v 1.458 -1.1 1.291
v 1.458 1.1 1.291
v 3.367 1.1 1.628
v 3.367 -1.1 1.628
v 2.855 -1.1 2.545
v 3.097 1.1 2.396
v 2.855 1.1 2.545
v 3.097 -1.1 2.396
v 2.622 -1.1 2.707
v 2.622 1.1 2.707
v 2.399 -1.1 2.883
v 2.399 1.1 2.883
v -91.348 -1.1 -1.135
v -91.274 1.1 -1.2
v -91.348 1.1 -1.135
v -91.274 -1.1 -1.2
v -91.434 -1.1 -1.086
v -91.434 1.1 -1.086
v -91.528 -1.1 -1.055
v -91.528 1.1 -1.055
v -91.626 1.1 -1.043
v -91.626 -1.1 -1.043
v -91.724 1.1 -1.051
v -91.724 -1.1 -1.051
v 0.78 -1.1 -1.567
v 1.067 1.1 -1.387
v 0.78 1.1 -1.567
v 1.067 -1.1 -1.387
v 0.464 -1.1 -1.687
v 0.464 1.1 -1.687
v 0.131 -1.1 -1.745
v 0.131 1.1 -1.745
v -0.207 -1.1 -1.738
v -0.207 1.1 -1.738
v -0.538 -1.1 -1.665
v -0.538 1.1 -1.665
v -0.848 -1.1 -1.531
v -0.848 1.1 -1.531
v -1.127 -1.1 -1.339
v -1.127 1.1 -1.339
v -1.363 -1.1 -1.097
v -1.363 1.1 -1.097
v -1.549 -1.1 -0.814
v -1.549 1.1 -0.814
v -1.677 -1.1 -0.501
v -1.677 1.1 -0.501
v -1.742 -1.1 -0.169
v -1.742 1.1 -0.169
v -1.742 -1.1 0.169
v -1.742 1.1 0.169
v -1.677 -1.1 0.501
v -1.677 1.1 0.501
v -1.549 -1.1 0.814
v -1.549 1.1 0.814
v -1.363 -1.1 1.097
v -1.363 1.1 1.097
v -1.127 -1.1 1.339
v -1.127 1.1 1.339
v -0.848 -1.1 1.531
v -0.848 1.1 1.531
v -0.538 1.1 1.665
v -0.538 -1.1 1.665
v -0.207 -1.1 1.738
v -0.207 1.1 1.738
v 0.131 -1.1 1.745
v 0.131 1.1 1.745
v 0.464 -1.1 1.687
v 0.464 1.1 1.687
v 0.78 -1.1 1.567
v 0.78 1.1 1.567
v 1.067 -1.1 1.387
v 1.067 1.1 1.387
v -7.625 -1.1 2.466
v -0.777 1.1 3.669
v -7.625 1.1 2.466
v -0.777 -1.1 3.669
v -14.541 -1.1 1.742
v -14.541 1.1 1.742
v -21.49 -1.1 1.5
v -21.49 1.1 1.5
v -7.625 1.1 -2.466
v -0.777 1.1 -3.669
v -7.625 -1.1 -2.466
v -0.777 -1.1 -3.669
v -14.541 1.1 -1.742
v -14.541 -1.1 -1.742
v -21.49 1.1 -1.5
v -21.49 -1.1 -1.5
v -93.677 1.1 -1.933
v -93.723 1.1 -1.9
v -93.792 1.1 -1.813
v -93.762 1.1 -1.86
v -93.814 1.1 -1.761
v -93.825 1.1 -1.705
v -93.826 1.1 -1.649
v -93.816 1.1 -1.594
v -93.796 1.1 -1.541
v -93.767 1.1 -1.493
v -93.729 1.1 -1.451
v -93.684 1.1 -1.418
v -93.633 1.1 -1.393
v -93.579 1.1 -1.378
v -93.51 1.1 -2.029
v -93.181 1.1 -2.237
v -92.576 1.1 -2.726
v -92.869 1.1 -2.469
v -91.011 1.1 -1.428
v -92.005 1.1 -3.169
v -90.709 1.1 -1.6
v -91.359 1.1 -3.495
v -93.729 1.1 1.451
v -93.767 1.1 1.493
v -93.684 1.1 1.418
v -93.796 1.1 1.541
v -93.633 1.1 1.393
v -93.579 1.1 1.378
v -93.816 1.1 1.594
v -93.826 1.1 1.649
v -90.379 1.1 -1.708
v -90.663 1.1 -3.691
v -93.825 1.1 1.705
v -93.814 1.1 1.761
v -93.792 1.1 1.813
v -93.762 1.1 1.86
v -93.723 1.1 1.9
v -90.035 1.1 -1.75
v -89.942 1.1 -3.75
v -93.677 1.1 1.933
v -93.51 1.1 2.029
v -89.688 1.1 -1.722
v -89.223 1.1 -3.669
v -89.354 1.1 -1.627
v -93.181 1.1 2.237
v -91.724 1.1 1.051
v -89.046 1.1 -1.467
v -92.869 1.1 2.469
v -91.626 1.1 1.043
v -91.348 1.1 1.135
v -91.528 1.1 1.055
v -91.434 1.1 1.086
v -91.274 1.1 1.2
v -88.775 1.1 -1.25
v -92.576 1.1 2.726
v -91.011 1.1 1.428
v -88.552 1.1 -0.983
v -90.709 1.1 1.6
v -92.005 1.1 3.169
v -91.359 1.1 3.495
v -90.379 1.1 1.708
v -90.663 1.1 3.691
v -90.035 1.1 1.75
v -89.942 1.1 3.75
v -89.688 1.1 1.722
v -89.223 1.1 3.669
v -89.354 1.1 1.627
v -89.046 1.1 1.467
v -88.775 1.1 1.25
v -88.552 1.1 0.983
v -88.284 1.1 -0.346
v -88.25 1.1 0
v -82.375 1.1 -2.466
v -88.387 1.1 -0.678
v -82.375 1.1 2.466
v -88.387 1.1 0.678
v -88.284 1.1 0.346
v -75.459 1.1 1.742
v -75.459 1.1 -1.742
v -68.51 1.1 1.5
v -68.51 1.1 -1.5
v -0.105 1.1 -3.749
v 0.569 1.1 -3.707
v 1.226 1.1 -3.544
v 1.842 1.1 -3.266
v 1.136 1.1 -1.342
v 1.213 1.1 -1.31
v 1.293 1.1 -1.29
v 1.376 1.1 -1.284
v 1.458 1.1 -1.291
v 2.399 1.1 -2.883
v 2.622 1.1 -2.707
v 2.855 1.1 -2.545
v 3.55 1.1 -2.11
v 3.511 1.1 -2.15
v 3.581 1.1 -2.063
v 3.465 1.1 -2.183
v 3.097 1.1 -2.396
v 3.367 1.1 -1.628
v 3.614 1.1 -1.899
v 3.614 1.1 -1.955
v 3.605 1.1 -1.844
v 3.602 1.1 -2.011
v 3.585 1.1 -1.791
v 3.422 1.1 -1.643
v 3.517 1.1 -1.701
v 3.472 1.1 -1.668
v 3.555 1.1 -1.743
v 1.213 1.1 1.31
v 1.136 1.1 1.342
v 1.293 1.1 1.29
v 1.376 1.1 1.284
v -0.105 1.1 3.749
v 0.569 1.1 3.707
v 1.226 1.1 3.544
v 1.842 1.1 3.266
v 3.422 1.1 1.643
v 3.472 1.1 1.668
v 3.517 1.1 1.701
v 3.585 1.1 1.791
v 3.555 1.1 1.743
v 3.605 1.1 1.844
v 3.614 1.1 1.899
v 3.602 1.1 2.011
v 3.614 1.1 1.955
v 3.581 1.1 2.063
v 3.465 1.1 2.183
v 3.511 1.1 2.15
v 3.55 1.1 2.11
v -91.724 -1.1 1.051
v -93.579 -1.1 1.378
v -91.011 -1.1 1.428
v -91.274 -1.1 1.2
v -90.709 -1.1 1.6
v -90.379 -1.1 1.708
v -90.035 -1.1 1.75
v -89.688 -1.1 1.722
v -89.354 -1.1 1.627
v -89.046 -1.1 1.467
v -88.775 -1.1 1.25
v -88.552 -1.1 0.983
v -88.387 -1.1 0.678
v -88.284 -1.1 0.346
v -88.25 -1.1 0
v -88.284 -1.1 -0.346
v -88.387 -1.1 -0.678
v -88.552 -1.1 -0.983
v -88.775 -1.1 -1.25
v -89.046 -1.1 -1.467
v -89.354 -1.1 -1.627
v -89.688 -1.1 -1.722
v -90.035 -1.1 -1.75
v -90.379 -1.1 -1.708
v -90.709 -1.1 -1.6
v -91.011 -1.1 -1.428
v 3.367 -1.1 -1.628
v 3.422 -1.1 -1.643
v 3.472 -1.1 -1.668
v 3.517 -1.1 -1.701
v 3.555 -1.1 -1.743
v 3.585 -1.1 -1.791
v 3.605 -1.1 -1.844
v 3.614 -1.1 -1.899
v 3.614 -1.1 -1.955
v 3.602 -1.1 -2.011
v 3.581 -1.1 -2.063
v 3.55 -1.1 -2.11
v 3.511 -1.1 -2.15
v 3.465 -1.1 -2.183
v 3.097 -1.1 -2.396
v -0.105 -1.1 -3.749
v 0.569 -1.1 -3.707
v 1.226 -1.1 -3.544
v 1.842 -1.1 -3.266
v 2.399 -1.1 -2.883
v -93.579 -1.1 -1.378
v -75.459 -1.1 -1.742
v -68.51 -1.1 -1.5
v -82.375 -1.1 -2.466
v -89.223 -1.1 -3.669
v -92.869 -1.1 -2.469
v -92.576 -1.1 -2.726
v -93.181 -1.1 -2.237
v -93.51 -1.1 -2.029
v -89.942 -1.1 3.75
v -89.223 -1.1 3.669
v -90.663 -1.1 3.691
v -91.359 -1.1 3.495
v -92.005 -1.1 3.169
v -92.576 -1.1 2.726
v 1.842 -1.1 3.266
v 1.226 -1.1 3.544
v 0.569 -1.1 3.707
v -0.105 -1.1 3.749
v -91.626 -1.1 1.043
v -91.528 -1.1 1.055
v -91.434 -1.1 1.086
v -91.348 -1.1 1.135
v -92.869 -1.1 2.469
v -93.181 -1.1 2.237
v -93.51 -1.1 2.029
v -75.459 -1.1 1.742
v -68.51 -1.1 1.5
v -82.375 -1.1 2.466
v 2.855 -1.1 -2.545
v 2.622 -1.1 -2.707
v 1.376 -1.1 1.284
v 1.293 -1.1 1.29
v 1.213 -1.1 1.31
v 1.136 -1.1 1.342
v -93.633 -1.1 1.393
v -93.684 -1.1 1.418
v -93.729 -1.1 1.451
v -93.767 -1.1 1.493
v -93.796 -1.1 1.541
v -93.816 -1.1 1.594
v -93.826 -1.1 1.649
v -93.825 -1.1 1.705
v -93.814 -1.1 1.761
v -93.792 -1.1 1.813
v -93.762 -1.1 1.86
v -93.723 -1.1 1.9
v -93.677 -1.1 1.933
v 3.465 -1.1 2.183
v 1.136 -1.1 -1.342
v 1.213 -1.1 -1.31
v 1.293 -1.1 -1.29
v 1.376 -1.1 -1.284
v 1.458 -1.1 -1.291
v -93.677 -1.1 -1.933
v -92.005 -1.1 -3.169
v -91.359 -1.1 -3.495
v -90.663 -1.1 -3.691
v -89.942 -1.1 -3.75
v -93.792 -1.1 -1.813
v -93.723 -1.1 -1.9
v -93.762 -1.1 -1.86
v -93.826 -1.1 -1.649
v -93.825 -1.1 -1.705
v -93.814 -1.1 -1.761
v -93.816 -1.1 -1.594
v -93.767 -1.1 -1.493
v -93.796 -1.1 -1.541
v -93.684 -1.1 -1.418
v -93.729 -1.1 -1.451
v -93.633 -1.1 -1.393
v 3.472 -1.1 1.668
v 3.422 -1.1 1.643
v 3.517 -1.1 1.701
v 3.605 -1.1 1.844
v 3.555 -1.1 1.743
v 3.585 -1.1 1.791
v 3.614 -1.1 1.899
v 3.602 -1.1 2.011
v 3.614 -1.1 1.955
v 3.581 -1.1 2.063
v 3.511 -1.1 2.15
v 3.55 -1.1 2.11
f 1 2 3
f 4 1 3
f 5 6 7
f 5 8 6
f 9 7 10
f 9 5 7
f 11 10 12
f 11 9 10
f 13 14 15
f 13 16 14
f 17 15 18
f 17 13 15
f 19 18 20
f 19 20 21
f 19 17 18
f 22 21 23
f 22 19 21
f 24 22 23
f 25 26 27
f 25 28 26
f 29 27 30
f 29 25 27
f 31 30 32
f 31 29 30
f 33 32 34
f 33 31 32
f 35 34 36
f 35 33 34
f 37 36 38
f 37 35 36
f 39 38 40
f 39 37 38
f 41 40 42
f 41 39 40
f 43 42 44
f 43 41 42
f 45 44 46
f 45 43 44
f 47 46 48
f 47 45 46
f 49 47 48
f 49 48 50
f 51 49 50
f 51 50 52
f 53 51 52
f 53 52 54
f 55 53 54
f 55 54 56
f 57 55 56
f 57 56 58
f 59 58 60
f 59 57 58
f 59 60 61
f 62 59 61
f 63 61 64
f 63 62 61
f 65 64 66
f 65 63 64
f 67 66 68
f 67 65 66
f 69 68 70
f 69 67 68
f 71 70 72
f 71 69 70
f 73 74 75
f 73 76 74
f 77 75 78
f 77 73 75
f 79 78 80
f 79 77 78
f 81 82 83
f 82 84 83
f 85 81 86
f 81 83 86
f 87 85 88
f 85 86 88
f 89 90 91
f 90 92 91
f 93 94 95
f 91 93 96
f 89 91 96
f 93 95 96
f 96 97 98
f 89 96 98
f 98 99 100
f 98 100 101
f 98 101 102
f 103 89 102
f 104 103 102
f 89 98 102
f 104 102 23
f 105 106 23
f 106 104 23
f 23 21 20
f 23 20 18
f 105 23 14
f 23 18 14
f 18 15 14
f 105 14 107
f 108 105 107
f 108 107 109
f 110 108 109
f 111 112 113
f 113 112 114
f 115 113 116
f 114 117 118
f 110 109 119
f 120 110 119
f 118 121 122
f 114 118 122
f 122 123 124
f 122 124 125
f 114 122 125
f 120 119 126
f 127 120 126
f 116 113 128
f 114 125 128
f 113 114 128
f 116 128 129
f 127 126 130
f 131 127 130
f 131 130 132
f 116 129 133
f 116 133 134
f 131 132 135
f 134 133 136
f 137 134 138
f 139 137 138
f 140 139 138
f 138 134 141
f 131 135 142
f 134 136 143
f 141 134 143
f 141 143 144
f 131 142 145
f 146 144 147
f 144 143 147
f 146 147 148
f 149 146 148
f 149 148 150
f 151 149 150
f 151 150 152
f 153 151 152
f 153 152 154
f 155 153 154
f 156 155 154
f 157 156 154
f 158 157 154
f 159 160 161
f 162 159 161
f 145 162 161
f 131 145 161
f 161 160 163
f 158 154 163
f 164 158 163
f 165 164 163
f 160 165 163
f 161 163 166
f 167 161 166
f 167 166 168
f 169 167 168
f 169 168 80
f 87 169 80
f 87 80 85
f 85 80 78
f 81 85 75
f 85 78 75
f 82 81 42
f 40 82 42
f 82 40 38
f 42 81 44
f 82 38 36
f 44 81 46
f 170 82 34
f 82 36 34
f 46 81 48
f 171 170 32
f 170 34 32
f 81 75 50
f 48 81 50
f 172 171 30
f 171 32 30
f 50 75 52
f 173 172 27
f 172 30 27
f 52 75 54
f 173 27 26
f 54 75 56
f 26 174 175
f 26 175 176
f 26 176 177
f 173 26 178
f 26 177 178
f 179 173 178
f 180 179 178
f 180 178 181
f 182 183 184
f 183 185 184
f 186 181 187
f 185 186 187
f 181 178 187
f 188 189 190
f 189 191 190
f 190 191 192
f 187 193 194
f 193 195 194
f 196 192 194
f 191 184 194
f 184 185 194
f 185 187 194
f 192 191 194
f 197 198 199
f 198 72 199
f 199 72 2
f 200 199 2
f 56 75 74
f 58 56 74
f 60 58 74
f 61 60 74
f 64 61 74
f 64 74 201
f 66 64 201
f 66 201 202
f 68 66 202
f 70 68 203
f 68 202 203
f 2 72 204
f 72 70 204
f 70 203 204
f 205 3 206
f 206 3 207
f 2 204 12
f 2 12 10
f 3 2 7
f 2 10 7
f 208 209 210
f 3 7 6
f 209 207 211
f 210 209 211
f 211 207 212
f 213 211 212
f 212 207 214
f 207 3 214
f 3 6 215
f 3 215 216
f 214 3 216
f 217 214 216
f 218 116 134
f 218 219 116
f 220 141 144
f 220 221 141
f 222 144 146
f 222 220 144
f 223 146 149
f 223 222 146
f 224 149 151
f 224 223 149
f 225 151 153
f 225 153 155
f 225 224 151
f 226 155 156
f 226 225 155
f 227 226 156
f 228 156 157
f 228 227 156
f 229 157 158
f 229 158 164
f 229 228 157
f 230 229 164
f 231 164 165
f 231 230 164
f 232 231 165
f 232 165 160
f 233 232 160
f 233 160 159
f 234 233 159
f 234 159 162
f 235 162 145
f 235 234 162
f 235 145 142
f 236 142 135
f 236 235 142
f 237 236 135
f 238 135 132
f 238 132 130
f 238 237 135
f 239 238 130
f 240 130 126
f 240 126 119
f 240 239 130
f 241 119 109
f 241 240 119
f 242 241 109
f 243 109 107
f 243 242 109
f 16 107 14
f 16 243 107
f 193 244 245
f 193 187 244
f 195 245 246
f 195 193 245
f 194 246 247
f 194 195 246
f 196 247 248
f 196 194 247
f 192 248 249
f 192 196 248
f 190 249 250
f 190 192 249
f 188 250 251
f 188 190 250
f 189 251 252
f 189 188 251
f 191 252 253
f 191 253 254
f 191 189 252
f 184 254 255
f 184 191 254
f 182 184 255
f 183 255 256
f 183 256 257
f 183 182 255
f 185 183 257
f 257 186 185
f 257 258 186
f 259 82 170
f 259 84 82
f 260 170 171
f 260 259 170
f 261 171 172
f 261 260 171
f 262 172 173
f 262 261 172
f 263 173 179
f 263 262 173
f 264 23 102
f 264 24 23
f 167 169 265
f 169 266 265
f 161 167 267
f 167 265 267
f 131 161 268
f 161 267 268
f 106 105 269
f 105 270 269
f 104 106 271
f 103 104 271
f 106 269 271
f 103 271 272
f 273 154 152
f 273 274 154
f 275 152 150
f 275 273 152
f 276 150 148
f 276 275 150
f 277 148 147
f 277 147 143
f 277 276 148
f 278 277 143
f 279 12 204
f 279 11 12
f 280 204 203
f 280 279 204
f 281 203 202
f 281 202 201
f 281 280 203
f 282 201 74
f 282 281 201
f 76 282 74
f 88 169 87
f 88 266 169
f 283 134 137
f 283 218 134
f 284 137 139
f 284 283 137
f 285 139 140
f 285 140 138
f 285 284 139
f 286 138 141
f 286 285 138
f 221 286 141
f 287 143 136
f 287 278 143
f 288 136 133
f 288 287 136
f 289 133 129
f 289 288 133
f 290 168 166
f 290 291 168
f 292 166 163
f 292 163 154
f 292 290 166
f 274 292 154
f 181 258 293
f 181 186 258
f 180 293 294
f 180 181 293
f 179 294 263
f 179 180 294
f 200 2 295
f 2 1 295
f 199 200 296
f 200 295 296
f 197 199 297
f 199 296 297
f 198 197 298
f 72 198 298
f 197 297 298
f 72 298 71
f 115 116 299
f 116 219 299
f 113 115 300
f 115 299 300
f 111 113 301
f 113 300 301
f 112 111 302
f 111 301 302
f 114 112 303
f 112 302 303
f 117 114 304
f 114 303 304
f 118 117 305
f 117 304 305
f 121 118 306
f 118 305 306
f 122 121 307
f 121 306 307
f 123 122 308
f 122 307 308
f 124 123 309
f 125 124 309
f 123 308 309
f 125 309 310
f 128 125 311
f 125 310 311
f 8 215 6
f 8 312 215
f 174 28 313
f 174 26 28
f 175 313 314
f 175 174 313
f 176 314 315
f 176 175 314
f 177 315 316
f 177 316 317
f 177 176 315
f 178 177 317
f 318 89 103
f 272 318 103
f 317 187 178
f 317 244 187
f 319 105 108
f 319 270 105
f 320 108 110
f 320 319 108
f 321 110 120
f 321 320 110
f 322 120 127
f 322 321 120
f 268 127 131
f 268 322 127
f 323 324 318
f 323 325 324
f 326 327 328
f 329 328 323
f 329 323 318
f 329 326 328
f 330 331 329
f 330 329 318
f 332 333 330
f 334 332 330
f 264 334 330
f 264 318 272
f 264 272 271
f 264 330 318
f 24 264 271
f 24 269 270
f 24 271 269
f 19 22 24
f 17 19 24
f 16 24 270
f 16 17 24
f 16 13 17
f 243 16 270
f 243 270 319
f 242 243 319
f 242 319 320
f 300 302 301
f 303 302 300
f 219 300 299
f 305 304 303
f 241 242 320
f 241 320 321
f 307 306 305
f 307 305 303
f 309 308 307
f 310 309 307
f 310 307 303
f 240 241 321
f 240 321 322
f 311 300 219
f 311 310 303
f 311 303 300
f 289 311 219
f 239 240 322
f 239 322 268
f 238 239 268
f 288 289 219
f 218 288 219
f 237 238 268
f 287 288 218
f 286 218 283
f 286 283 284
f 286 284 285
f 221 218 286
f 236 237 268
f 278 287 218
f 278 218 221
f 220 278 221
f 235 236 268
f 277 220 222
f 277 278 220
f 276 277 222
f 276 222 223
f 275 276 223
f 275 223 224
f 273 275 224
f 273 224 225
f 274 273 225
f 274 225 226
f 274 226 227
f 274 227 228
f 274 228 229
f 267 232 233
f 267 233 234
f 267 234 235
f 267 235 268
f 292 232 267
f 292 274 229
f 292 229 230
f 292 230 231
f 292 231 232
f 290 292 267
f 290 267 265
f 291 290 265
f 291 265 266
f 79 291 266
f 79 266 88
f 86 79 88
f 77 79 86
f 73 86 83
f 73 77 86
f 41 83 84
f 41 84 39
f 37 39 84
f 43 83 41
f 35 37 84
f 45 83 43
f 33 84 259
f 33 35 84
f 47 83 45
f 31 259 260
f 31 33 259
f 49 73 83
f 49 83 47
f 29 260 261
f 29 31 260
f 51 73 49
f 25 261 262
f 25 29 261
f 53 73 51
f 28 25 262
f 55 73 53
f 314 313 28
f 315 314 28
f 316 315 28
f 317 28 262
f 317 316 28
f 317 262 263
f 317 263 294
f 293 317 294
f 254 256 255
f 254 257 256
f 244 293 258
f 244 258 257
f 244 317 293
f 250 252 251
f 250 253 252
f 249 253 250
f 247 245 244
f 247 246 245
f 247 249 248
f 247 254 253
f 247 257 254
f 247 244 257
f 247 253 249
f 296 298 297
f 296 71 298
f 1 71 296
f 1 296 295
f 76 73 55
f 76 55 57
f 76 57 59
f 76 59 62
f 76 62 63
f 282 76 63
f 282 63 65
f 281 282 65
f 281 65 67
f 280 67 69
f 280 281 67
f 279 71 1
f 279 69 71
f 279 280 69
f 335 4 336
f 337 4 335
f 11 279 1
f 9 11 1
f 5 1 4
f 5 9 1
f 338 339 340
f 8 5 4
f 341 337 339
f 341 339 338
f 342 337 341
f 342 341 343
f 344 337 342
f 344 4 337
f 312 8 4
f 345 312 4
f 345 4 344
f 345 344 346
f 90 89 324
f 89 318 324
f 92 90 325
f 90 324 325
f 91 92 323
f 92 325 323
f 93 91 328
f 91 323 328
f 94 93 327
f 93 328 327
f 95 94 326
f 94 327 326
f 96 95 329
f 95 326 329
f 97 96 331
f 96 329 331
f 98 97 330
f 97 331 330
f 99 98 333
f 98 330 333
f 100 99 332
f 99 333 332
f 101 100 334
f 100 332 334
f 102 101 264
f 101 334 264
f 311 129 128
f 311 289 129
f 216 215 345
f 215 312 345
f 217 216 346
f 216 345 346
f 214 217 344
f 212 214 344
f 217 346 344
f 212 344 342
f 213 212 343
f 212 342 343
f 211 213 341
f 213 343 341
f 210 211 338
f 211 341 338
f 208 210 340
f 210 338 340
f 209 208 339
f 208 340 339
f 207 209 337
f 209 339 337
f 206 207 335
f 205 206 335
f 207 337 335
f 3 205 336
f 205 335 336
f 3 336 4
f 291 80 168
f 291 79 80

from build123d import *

# Parameters (mm, degrees)
F1_DEPTH = 1.1
F2_R     = 0.3
F3_R     = 100
F4_R     = 0.5
F5_R     = 5


with BuildPart() as f1:
    # F0 (on Front) → F1 (new body, symmetric)
    with BuildSketch(Plane.XZ):
        with BuildLine():
            ThreePointArc((1.224745, -1.25), (-1.75, 0), (1.224745, 1.25))
            Line((1.224745, 1.25), (4.179168, 1.770945))
            Line((4.179168, 1.770945), (2.648788, 2.65451))
            ThreePointArc((2.648788, 2.65451), (-0.698939, 3.684289), (-3.436932, 1.5))
            Line((-3.436932, 1.5), (-86.563068, 1.5))
            ThreePointArc((-86.563068, 1.5), (-89.480722, 3.713873), (-92.893705, 2.385156))
            Line((-92.893705, 2.385156), (-94.390564, 1.520945))
            Line((-94.390564, 1.520945), (-91.436141, 1))
            ThreePointArc((-91.436141, 1), (-88.25, 0), (-91.436141, -1))
            Line((-91.436141, -1), (-94.390564, -1.520945))
            Line((-94.390564, -1.520945), (-92.893705, -2.385156))
            ThreePointArc((-92.893705, -2.385156), (-89.480722, -3.713873), (-86.563068, -1.5))
            Line((-86.563068, -1.5), (-3.436932, -1.5))
            ThreePointArc((-3.436932, -1.5), (-0.698939, -3.684289), (2.648788, -2.65451))
            Line((2.648788, -2.65451), (4.179168, -1.770945))
            Line((4.179168, -1.770945), (1.224745, -1.25))
        make_face()
    extrude(amount=F1_DEPTH, both=True)

    # F2
    f2_edges = [f1.edges().sort_by_distance(p)[0] for p in [
        (4.179168, 0, 1.770945),
        (4.179168, 0, -1.770945),
        (-94.390564, 0, -1.520945),
        (-94.390564, 0, 1.520945),
    ]]
    fillet(f2_edges, radius=F2_R)

    # F3
    f3_edges = [f1.edges().sort_by_distance(p)[0] for p in [
        (-3.436932, 0, 1.5),
        (-3.436932, 0, -1.5),
        (-86.563068, 0, 1.5),
        (-86.563068, 0, -1.5),
    ]]
    fillet(f3_edges, radius=F3_R)

    # F4
    f4_edges = [f1.edges().sort_by_distance(p)[0] for p in [
        (1.224745, 0, 1.25),
        (1.224745, 0, -1.25),
        (-91.436141, 0, 1),
        (-91.436141, 0, -1),
    ]]
    fillet(f4_edges, radius=F4_R)

    # F5
    f5_edges = [f1.edges().sort_by_distance(p)[0] for p in [
        (2.648788, 0, 2.65451),
        (2.648788, 0, -2.65451),
        (-92.893705, 0, -2.385156),
        (-92.893705, 0, 2.385156),
    ]]
    fillet(f5_edges, radius=F5_R)


solid = f1.part
